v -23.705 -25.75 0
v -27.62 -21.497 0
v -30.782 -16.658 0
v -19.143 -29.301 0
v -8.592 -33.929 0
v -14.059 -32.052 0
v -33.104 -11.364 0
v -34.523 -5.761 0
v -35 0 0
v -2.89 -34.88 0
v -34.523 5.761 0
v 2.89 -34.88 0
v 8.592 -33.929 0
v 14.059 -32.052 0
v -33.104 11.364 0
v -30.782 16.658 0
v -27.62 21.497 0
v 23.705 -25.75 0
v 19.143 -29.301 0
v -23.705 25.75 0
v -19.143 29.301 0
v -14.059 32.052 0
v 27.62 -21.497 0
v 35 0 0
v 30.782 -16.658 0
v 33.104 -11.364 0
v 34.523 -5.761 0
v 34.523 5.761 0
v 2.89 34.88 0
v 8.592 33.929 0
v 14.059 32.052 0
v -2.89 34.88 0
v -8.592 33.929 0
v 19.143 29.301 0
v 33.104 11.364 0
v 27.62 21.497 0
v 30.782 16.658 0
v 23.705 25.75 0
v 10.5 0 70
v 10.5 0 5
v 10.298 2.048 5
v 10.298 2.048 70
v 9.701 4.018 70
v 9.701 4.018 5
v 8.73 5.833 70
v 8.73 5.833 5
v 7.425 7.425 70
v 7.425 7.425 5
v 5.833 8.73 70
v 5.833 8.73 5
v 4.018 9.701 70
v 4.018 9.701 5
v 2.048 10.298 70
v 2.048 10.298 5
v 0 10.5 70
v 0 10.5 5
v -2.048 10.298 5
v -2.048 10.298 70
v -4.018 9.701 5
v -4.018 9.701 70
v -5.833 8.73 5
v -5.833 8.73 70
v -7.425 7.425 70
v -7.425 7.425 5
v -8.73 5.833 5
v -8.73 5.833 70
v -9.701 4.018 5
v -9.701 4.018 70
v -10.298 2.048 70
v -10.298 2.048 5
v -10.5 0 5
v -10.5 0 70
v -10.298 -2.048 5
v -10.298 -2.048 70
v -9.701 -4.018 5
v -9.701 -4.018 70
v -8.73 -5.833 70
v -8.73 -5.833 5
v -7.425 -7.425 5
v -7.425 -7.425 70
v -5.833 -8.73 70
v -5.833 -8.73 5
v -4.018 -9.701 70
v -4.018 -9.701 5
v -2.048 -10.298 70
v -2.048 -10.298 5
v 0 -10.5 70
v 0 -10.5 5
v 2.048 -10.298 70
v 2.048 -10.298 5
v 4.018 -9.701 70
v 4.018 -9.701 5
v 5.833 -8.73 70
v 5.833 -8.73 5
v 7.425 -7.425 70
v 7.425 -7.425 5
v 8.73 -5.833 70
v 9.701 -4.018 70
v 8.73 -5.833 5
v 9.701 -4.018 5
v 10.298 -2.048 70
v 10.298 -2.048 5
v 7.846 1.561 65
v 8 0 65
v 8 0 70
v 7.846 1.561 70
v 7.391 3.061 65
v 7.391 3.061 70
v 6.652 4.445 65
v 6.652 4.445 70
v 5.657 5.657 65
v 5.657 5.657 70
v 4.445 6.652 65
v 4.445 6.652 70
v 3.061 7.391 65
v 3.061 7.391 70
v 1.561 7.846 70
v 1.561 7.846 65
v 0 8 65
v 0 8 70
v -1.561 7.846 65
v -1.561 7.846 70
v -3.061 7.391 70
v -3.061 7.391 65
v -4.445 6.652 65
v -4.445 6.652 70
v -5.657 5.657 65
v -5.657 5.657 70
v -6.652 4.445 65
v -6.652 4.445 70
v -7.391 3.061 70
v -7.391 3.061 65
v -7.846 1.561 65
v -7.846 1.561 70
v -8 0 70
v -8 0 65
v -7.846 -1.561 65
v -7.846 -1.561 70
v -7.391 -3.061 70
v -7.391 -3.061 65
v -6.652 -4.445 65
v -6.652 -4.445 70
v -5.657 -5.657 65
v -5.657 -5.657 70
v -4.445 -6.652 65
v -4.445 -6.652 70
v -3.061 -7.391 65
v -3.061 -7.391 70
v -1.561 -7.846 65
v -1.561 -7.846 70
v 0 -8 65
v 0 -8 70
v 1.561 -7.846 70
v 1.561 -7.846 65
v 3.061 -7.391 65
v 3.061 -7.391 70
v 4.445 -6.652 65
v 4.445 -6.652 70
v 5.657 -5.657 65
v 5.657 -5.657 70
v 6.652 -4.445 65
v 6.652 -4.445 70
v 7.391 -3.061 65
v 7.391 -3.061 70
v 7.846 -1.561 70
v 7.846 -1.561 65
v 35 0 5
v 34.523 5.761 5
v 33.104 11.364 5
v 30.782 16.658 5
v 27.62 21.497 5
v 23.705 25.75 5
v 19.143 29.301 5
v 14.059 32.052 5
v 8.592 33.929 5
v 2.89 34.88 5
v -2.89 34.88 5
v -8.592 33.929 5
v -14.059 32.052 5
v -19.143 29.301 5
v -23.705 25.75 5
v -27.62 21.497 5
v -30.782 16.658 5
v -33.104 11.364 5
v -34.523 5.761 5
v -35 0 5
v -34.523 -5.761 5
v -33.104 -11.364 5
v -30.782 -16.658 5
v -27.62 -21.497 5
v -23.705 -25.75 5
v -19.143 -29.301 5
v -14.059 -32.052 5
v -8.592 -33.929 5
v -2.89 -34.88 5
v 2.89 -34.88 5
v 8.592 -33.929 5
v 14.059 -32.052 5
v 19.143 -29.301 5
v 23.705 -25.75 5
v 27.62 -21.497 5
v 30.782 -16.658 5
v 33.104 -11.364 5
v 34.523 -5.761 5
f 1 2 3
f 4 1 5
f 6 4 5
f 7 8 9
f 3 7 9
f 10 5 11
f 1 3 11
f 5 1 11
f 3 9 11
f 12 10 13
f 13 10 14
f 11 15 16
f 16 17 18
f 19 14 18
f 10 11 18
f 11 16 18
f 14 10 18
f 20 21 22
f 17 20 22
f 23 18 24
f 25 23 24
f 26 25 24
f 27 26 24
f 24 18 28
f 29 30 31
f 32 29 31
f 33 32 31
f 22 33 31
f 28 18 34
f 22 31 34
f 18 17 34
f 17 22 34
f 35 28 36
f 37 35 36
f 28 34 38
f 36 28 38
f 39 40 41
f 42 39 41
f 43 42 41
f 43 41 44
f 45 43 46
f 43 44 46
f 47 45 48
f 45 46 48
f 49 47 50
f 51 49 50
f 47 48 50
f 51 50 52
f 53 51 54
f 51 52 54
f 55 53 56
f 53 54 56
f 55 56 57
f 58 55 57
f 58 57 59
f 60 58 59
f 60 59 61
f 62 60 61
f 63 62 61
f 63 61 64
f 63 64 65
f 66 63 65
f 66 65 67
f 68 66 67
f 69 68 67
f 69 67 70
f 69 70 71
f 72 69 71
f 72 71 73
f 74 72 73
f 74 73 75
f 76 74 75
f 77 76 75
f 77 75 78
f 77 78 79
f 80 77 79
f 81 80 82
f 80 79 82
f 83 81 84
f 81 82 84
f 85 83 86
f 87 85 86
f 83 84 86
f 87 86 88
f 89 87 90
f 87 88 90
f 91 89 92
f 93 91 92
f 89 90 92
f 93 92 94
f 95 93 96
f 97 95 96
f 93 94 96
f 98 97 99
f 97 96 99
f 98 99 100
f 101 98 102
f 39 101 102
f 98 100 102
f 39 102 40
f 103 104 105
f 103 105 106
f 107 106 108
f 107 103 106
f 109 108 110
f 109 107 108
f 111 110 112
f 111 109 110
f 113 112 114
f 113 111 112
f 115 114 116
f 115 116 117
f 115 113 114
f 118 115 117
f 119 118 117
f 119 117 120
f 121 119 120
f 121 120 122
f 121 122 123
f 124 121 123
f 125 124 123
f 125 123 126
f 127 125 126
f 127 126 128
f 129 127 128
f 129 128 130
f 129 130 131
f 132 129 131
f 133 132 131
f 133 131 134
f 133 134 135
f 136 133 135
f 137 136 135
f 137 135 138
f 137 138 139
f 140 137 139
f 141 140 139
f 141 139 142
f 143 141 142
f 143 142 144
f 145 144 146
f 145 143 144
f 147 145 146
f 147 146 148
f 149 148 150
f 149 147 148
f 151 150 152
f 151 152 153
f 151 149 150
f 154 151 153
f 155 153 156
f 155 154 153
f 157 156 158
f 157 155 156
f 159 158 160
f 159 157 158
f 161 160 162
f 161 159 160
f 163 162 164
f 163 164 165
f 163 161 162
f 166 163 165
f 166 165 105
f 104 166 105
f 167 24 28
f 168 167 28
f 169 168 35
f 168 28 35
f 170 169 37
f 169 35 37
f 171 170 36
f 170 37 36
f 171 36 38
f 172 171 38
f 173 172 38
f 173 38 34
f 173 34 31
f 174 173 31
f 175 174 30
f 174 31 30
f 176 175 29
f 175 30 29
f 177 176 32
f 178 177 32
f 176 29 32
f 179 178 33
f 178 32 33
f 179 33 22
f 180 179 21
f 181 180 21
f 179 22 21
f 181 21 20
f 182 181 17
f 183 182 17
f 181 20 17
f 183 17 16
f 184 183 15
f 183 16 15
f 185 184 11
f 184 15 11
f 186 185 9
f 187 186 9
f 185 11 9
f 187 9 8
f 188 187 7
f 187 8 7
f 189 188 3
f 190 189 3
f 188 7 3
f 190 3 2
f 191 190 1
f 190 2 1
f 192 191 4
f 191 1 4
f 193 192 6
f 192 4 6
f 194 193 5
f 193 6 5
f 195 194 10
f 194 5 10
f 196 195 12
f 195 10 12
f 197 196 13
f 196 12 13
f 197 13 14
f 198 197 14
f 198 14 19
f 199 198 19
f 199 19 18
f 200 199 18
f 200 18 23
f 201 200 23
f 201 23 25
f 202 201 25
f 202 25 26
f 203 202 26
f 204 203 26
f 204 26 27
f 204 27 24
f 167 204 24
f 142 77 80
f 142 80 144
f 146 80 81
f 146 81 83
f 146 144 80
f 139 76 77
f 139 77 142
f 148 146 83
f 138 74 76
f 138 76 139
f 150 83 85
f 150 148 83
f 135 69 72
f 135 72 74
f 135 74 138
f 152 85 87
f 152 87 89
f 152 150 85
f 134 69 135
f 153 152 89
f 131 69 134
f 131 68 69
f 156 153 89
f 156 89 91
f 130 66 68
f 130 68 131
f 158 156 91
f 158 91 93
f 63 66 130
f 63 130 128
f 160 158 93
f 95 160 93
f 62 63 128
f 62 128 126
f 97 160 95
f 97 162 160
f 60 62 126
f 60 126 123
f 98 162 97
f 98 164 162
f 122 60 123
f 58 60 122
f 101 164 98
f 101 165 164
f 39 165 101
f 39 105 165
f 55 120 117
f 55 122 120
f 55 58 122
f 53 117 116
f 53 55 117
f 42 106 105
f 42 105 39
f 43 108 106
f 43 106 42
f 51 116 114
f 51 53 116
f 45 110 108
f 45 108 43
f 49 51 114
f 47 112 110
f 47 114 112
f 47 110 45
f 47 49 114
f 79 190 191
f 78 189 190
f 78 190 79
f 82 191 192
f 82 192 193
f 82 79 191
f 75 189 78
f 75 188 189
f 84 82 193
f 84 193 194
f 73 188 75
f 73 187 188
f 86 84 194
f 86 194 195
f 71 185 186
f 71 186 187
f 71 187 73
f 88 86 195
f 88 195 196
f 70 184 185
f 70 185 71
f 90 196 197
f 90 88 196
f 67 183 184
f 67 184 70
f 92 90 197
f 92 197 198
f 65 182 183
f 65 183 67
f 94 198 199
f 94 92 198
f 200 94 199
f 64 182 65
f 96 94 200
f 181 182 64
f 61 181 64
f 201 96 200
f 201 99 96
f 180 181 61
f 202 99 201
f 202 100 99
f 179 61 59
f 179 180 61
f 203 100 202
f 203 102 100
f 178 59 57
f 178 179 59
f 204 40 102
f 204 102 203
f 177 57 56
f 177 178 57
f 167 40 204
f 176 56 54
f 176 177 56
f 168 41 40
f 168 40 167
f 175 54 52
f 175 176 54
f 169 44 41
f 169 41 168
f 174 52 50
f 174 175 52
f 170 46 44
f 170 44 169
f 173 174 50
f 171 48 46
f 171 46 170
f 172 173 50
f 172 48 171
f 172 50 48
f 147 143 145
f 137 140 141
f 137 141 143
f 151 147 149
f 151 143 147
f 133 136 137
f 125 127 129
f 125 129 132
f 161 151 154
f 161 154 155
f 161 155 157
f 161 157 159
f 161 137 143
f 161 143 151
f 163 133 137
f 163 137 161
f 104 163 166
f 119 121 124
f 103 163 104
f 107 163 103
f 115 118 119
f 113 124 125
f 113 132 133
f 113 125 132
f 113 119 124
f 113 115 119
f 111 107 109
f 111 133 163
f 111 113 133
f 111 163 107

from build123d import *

# Parameters (mm, degrees)
F0_R     = 35
F0_R_2   = 10.5
F1_DEPTH = 5
F0_R_3   = 8
F2_DEPTH = 70
F3_DEPTH = 65


with BuildPart() as f1:
    # F0 (on Top) → F1 (new body)
    with BuildSketch(Plane.XY):
        Circle(F0_R)
        Circle(F0_R_2, mode=Mode.SUBTRACT)
    extrude(amount=F1_DEPTH)

    # F0 (on Top) → F2 (join)
    with BuildSketch(Plane.XY):
        Circle(F0_R_2)
        Circle(F0_R_3, mode=Mode.SUBTRACT)
    extrude(amount=F2_DEPTH)

    # F0 (on Top) → F3 (join)
    with BuildSketch(Plane.XY):
        Circle(F0_R_3)
    extrude(amount=F3_DEPTH)


solid = f1.part
